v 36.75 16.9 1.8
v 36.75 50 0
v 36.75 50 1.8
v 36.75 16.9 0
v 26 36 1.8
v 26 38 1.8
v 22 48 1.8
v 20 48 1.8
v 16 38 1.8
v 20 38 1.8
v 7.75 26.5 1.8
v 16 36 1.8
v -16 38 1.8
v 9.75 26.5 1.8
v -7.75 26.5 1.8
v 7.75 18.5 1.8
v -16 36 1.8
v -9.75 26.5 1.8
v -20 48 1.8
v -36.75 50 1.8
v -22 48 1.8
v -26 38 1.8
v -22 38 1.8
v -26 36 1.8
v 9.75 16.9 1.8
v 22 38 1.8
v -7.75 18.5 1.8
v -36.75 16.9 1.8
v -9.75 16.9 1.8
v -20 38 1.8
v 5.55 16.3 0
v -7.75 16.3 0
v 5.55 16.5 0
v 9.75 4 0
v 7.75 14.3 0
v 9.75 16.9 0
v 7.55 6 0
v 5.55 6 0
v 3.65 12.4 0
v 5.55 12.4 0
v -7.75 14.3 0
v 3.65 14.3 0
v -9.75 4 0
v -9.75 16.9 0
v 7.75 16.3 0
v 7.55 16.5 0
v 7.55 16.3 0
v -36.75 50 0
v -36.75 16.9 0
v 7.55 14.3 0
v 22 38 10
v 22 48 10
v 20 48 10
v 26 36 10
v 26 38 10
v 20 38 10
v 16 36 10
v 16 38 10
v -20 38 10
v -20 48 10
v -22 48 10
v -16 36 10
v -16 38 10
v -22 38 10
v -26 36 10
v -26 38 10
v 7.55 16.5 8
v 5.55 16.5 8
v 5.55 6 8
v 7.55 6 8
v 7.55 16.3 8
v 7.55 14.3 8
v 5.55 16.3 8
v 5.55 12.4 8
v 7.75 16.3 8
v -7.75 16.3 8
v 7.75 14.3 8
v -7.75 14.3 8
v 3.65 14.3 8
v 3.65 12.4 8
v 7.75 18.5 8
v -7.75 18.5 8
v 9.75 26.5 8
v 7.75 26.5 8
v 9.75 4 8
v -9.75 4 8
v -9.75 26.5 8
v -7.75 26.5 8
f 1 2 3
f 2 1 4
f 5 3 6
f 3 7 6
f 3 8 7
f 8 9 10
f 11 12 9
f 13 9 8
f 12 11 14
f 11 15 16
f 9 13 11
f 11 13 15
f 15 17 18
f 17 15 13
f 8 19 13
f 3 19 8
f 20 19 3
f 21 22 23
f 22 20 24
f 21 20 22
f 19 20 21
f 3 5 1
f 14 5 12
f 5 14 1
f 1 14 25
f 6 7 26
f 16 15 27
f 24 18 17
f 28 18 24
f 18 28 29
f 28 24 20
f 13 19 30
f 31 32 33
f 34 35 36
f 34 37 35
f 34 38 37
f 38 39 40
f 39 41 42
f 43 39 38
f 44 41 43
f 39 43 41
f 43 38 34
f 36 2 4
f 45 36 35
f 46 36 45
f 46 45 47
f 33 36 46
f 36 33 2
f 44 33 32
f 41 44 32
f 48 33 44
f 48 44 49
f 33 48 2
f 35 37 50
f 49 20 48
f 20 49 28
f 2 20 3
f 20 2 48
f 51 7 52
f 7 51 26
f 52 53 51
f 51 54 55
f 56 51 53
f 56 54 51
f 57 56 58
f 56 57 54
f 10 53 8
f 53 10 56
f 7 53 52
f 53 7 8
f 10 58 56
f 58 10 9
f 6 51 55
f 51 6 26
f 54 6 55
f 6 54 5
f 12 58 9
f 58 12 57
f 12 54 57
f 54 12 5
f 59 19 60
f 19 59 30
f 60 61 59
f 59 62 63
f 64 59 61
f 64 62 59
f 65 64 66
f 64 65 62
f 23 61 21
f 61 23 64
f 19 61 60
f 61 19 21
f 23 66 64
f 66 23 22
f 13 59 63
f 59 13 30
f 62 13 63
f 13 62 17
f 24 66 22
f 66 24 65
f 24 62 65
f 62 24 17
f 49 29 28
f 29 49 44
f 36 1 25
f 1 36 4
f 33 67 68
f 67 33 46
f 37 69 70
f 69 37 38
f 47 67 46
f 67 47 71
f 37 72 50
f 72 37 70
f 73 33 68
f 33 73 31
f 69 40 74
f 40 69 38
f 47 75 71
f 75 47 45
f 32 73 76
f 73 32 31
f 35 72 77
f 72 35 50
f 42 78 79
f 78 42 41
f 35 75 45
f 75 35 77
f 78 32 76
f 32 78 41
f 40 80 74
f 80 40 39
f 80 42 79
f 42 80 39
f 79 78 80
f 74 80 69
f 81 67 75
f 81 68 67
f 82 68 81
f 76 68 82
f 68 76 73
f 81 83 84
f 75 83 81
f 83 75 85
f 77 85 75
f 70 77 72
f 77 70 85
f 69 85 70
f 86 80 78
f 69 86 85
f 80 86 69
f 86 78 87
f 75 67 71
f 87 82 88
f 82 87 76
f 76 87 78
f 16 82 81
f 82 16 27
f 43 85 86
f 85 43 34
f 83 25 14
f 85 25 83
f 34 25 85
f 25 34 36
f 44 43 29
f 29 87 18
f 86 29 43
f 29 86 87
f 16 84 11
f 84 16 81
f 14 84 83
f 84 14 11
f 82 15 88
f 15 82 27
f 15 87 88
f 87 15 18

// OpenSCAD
$fn=30;
ts=2;


ugol=[10+0.5,15+0.5,2+0.4];//размеры уголка высота/ширина/толщина
pole=[150,80,ts];// [20,30,ts];;//размеры поля
stk=[ts,10,6*ts];//размеры стойки 
stl=[ts*3+stk.x, ts*3+stk.y, stk.z];//размеры столба
z5r=45;//
z5r_net=[59,40];//

fp=[stk.x-0.2,stk.y-0.4,50];//форма прижимной пласитны 

hz=10;
hx=4.5;



//all();
//translate([0,0,5*ts])rotate([0,0,90])
//list1();
//test();
//test1();
test_net();
//test_un1();

module list1(){
    difference(){
        list();
        translate([0,(stl.z+2*ts)/2-0.1,0])cube([ugol.y+2*ts,stl.z+2*ts,fp.x*3],true);
    }
}


module list(){
    form();
    translate([0,fp.z-hz/2-ts,hz/2])cube([hx,hz,hz],true);
}

//form();
//un();
module un(){
    form();
    //translate([z5r_net.y/2+ts/2,fp.z-hz/2-ts,hz/2])cube([ts,hz,hz],true);  
    translate([0,fp.z-hz/2-hz/2,hz/2])cube([pole.y-3*ts,ts,hz],true); 
    //translate([-(z5r_net.y/2+ts/2),fp.z-hz/2-ts,hz/2])cube([ts,hz,hz],true);
    //translate([-(z5r_net.y/2+ts/2),fp.z-hz/2-hz/2,hz/2])cube([hz,ts,hz],true);   
}


module net(){
    form();
    translate([z5r_net.y/2+ts/2,fp.z-hz/2-ts,hz/2])cube([ts,hz,hz],true);  
    translate([z5r_net.y/2+ts/2,fp.z-hz-ts-ts/2,hz/2])cube([hz,ts,hz],true); 
    translate([-(z5r_net.y/2+ts/2),fp.z-hz/2-ts,hz/2])cube([ts,hz,hz],true);
    translate([-(z5r_net.y/2+ts/2),fp.z-hz-ts-ts/2,hz/2])cube([hz,ts,hz],true);   
}
//net1();
module net1(){
    form();
    translate([8,fp.z-hz/4-ts,hz/2])cube([ts,hz/2,hz],true);  
    //translate([z5r_net.y/2+ts/2,fp.z-hz/2-hz/2,hz/2])cube([hz,ts,hz],true); 
    translate([-(z5r_net.y/4),fp.z-hz/2-ts,hz/2])cube([ts,hz,hz],true);
    //translate([-(z5r_net.y/2+ts/2),fp.z-hz/2-hz/2,hz/2])cube([hz,ts,hz],true);   
}
module form(){
    
    difference(){
        translate([0,fp.z/2,fp.x/2])cube([pole.y-3*ts-0.5,fp.z,fp.x],true);
        translate([0,stl.z/2-0.1,0])cube([pole.y-fp.y*2-3*ts,stl.z,fp.x*3],true);
    }
}



module test1(){
    translate([ugol.y/2+ts/2,stl.x/2+ugol.x+4*ts,stl.x/2])cube([ ts,stl.x, stl.x],true);
    translate([-(ugol.y/2+ts/2),stl.x/2+ugol.x+4*ts,stl.x/2])cube([ ts,stl.x, stl.x],true);
    difference(){
        list();
        translate([0,(ugol.x+4*ts-ts+0.5)/2-0.1,0])cube([pole.y+fp.y*2,ugol.x+4*ts-ts+0.5,fp.x*3],true);
    }
    translate([0,0,stl.x])rotate([180,0,-90])translate([-ts*2,0,stl.x/2])rotate([0,-90,0])difference(){
        translate([0,0,(ugol.x+2*ts)/2])cube([ stl.x,ugol.y+2*ts, ugol.x+2*ts],true);
        translate([0,0,-2*ts])ug();
    }
}

module test_un1(){
    translate([ugol.y/2+ts/2,stl.x/2+ugol.x+4*ts,stl.x/2])cube([ ts,stl.x, stl.x],true);
    translate([-(ugol.y/2+ts/2),stl.x/2+ugol.x+4*ts,stl.x/2])cube([ ts,stl.x, stl.x],true);
    difference(){
        un();
        translate([0,(ugol.x+4*ts-ts+0.5)/2-0.1,0])cube([pole.y+fp.y*2,ugol.x+4*ts-ts+0.5,fp.x*3],true);
    }
    translate([0,0,stl.x])rotate([180,0,-90])translate([-ts*2,0,stl.x/2])rotate([0,-90,0])difference(){
        translate([0,0,(ugol.x+2*ts)/2])cube([ stl.x,ugol.y+2*ts, ugol.x+2*ts],true);
        translate([0,0,-2*ts])ug();
    }
}

module test(){
    translate([ugol.y/2+ts/2,stl.x/2+ugol.x+4*ts,stl.x/2])cube([ ts,stl.x, stl.x],true);
    translate([-(ugol.y/2+ts/2),stl.x/2+ugol.x+4*ts,stl.x/2])cube([ ts,stl.x, stl.x],true);
    difference(){
        list();
        translate([0,(ugol.x+4*ts-ts+0.5)/2-0.1,0])cube([pole.y+fp.y*2,ugol.x+4*ts-ts+0.5,fp.x*3],true);
    }
    rotate([0,0,-90])translate([-ts*2,0,stl.x/2])rotate([0,-90,0])difference(){
        translate([0,0,(ugol.x+2*ts)/2])cube([ stl.x,ugol.y+2*ts, ugol.x+2*ts],true);
        translate([0,0,-2*ts])ug();
    }
}

module test_un(){
    translate([ugol.y/2+ts/2,stl.x/2+ugol.x+4*ts,stl.x/2])cube([ ts,stl.x, stl.x],true);
    translate([-(ugol.y/2+ts/2),stl.x/2+ugol.x+4*ts,stl.x/2])cube([ ts,stl.x, stl.x],true);
    difference(){
        un();
        translate([0,(ugol.x+4*ts-ts+0.5)/2-0.1,0])cube([pole.y+fp.y*2,ugol.x+4*ts-ts+0.5,fp.x*3],true);
    }
    rotate([0,0,-90])translate([-ts*2,0,stl.x/2])rotate([0,-90,0])difference(){
        translate([0,0,(ugol.x+2*ts)/2])cube([ stl.x,ugol.y+2*ts, ugol.x+2*ts],true);
        translate([0,0,-2*ts])ug();
    }
}

module test_net1(){
    translate([ugol.y/2+ts/2,stl.x/2+ugol.x+4*ts,stl.x/2])cube([ ts,stl.x, stl.x],true);
    translate([-(ugol.y/2+ts/2),stl.x/2+ugol.x+4*ts,stl.x/2])cube([ ts,stl.x, stl.x],true);
    difference(){
        net1();
        translate([0,(ugol.x+4*ts-ts+0.5)/2-0.1,0])cube([pole.y+fp.y*2,ugol.x+4*ts-ts+0.5,fp.x*3],true);
    }
    translate([0,0,stl.x])rotate([180,0,-90])translate([-ts*2,0,stl.x/2])rotate([0,-90,0])difference(){
        translate([0,0,(ugol.x+2*ts)/2])cube([ stl.x,ugol.y+2*ts, ugol.x+2*ts],true);
        translate([0,0,-2*ts])ug();
    }
}
module test_net(){
    translate([ugol.y/2+ts/2,stl.x/2+ugol.x+4*ts,stl.x/2])cube([ ts,stl.x, stl.x],true);
    translate([-(ugol.y/2+ts/2),stl.x/2+ugol.x+4*ts,stl.x/2])cube([ ts,stl.x, stl.x],true);
    difference(){
        net();
        translate([0,(ugol.x+4*ts-ts+0.5)/2-0.1,0])cube([pole.y+fp.y*2,ugol.x+4*ts-ts+0.5,fp.x*3],true);
    }
    rotate([0,0,-90])translate([-ts*2,0,stl.x/2])rotate([0,-90,0])difference(){
        translate([0,0,(ugol.x+2*ts)/2])cube([ stl.x,ugol.y+2*ts, ugol.x+2*ts],true);
        translate([0,0,-2*ts])ug();
    }
}



module all(){
    difference(){
        plf();
        ug();
    }
}

module plf(){
    translate([0,0,pole.z/2])cube(pole,true);
    translate([pole.x/2-ugol.y/2,0,(ugol.x+4*ts)/2])cube([ ugol.y,ugol.y+2*ts, ugol.x+4*ts],true);
    translate([-(pole.x/2-ugol.y/2),0,(ugol.x+4*ts)/2])cube([ ugol.y,ugol.y+2*ts, ugol.x+4*ts],true);
    //translate([pole.x/4,0,0])stolb();
    //translate([pole.x/4-z5r-ts,0,0])stolb();
    //translate([pole.x/4-z5r_net-ts,0,0])stolb();
}

module stolb(){
    difference(){
        union(){
            translate([0,pole.y/2-stl.y/2,stl.z/2])cube(stl,true);
            translate([0,-(pole.y/2-stl.y/2),stl.z/2])cube(stl,true); 
        }
            translate([0,pole.y/2-stl.y/2,stl.z/2+ts])cube(stk,true);
            translate([0,-(pole.y/2-stl.y/2),stl.z/2+ts])cube(stk,true); 
    }
}


module ug(){
    translate([0,ugol.y/2-ugol.z/2,ugol.x/2+ts*3])cube([pole.x*2,ts,ugol.x],true);
    translate([0,0,ugol.x/2+ts*3+ugol.x/2-ugol.z/2])cube([pole.x*2+4*ts,ugol.y,ts],true);
    translate([0,ugol.y/2-ugol.z/2-ts+0.1,ugol.x/2+ts*2+ugol.x/2-ugol.z/2+0.1])cube([pole.x*2+4*ts,ts,ts],true);
}
